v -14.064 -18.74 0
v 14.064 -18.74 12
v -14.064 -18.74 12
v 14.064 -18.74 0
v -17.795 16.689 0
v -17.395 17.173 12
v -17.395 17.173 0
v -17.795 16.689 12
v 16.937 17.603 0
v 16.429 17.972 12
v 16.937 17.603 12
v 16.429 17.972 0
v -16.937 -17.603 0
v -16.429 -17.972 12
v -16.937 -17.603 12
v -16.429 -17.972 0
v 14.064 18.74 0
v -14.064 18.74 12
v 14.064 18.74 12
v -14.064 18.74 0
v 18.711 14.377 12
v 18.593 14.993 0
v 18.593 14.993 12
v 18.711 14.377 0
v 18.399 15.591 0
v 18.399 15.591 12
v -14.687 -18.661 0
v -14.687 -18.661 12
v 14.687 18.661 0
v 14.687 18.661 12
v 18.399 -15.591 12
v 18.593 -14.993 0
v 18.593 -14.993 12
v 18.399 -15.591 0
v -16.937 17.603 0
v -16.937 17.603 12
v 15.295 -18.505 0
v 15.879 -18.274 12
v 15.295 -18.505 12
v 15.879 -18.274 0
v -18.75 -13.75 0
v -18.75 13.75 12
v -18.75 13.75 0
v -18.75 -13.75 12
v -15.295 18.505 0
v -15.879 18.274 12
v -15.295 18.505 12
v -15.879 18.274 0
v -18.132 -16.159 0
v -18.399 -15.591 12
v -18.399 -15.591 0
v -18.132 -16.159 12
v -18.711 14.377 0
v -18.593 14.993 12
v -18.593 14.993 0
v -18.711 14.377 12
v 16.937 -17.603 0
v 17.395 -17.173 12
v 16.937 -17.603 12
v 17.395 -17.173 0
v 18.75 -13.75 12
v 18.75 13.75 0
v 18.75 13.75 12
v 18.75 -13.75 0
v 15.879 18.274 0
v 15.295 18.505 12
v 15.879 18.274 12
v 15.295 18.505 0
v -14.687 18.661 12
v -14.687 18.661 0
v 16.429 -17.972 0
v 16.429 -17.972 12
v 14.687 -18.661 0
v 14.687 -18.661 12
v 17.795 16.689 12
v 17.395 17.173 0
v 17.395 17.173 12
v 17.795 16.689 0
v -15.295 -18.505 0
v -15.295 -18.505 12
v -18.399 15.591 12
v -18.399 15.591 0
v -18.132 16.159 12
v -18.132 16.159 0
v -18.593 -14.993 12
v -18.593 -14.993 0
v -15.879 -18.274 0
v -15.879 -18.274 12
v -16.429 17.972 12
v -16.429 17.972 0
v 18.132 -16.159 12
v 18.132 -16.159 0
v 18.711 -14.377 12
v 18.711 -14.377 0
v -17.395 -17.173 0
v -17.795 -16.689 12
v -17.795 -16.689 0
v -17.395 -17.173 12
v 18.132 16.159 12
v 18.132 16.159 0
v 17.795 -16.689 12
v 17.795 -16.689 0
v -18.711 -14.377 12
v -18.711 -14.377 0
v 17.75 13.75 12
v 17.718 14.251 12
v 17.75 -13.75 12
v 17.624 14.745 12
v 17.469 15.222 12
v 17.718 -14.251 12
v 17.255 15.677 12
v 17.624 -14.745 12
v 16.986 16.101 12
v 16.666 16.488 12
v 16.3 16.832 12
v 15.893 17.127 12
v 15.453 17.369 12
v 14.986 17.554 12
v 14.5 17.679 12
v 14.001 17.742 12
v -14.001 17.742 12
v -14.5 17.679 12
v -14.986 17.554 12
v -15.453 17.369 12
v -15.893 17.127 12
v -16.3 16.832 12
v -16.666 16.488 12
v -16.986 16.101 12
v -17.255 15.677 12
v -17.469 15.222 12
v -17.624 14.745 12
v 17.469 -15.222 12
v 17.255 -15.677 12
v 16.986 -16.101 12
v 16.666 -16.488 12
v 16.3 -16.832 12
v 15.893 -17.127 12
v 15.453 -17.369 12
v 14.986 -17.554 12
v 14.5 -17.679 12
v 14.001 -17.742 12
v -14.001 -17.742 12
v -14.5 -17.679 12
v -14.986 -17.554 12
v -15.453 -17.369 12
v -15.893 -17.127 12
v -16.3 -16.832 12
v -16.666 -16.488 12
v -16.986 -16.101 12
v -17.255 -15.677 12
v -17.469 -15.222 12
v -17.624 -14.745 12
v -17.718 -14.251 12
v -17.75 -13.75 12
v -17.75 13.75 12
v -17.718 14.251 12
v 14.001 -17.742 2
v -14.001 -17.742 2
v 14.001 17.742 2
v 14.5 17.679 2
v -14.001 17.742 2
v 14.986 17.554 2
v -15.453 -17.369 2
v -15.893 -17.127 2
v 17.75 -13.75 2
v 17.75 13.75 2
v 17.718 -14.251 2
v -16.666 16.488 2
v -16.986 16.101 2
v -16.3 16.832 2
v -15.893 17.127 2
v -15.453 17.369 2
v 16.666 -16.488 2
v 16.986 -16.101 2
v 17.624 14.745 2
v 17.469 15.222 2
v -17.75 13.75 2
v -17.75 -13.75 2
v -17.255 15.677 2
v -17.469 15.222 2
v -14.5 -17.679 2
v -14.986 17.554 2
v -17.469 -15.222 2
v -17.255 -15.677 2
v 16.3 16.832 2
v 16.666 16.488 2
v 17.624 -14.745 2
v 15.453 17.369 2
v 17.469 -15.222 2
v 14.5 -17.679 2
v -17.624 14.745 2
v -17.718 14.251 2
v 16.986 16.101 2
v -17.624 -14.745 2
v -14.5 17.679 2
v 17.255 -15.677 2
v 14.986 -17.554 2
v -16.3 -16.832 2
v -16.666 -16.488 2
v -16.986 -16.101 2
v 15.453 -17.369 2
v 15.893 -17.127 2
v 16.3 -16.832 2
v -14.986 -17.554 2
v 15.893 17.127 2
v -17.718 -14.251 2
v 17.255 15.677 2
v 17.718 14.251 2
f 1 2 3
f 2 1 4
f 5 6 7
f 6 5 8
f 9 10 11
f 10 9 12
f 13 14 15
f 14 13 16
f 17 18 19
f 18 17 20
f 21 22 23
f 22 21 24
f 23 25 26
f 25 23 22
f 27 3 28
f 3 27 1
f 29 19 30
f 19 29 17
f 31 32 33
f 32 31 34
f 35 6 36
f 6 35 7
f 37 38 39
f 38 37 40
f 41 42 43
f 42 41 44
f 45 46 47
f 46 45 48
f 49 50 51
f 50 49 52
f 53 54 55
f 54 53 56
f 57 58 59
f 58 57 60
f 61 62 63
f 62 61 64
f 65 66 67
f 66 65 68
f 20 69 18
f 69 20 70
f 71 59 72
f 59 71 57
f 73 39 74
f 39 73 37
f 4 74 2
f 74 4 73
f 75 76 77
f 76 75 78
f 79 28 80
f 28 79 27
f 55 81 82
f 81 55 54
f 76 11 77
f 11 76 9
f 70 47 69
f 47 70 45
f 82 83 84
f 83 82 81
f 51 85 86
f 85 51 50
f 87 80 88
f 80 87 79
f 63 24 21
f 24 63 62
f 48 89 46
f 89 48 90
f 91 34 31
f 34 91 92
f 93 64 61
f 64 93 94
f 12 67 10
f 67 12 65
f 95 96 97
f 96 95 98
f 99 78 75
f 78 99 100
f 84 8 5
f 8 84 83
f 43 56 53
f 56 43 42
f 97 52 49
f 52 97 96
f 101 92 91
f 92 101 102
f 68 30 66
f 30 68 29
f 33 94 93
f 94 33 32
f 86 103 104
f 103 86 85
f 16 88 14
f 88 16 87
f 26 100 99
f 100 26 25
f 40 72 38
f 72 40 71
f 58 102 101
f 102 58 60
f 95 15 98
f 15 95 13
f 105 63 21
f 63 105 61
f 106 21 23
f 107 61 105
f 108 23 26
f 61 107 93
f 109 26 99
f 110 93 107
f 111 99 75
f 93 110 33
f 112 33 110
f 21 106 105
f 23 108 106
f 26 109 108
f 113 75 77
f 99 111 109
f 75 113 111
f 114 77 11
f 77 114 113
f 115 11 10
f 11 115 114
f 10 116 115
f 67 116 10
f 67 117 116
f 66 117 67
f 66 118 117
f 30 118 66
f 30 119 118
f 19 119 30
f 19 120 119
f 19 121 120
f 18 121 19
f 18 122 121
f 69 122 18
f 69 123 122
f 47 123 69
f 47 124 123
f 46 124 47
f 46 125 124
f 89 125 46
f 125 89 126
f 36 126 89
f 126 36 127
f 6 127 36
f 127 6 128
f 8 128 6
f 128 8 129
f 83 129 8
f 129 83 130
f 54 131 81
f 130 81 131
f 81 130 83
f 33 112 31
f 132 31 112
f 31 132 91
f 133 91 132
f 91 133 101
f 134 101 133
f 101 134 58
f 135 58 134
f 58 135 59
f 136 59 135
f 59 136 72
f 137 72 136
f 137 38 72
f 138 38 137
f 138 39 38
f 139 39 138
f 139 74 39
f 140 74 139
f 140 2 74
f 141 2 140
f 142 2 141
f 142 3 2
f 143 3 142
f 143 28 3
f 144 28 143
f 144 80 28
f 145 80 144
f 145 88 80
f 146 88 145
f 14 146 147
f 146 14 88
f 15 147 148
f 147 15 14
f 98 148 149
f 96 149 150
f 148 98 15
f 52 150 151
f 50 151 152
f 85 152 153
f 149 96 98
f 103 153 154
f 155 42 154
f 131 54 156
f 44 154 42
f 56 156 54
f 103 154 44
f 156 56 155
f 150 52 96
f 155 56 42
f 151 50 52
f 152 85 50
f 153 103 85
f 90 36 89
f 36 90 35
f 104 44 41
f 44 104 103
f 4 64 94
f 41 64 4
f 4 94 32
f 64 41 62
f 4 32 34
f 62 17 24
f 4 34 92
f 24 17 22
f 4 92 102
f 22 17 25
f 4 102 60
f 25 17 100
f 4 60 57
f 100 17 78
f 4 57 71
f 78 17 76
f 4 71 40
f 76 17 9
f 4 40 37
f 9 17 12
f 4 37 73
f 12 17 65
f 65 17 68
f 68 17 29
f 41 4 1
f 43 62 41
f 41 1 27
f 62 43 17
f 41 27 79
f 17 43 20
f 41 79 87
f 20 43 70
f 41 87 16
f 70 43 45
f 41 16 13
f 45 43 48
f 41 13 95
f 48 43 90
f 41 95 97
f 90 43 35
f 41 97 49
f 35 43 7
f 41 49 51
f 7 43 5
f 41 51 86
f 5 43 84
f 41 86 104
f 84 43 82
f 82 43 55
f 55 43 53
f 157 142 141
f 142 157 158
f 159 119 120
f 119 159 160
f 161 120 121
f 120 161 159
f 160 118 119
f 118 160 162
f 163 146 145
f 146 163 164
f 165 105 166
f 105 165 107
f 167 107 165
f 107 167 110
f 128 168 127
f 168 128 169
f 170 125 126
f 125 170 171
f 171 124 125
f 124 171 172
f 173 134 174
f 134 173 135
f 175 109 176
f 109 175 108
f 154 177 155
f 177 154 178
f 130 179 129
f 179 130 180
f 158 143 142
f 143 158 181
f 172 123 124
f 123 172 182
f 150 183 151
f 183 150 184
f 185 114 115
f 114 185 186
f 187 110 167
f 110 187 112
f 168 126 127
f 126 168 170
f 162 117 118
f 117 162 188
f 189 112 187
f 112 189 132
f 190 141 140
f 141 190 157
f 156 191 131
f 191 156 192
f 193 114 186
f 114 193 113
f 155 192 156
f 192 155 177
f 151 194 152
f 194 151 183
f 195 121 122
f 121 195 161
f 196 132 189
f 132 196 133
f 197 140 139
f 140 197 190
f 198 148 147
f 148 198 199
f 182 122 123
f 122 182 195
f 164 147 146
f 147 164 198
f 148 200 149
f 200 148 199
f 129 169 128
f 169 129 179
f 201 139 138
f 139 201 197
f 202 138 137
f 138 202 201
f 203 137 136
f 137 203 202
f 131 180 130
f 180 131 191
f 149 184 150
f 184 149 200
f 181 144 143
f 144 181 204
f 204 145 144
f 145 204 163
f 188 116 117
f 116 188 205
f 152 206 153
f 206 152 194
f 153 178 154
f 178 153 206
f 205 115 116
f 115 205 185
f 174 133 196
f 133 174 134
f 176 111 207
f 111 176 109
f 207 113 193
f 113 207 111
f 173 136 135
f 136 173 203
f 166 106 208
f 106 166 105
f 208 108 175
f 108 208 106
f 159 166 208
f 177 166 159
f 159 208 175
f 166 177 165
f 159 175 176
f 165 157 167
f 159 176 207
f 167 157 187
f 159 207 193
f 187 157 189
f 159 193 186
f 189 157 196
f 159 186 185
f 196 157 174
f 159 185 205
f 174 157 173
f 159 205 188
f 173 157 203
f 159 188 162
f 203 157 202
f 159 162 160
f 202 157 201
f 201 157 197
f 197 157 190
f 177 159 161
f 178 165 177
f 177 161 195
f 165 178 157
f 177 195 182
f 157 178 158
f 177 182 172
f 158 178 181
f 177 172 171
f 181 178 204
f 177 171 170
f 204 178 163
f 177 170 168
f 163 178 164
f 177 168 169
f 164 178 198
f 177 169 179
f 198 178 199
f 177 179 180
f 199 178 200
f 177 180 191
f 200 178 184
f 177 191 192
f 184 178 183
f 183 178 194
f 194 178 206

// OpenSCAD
$fn = 50;


difference() {
	union() {
		hull() {
			translate(v = [-13.7500000000, 13.7500000000, 0]) {
				cylinder(h = 12, r = 5);
			}
			translate(v = [13.7500000000, 13.7500000000, 0]) {
				cylinder(h = 12, r = 5);
			}
			translate(v = [-13.7500000000, -13.7500000000, 0]) {
				cylinder(h = 12, r = 5);
			}
			translate(v = [13.7500000000, -13.7500000000, 0]) {
				cylinder(h = 12, r = 5);
			}
		}
	}
	union() {
		translate(v = [0, 0, 2]) {
			hull() {
				translate(v = [-13.7500000000, 13.7500000000, 0]) {
					cylinder(h = 10, r = 4);
				}
				translate(v = [13.7500000000, 13.7500000000, 0]) {
					cylinder(h = 10, r = 4);
				}
				translate(v = [-13.7500000000, -13.7500000000, 0]) {
					cylinder(h = 10, r = 4);
				}
				translate(v = [13.7500000000, -13.7500000000, 0]) {
					cylinder(h = 10, r = 4);
				}
			}
		}
	}
}
